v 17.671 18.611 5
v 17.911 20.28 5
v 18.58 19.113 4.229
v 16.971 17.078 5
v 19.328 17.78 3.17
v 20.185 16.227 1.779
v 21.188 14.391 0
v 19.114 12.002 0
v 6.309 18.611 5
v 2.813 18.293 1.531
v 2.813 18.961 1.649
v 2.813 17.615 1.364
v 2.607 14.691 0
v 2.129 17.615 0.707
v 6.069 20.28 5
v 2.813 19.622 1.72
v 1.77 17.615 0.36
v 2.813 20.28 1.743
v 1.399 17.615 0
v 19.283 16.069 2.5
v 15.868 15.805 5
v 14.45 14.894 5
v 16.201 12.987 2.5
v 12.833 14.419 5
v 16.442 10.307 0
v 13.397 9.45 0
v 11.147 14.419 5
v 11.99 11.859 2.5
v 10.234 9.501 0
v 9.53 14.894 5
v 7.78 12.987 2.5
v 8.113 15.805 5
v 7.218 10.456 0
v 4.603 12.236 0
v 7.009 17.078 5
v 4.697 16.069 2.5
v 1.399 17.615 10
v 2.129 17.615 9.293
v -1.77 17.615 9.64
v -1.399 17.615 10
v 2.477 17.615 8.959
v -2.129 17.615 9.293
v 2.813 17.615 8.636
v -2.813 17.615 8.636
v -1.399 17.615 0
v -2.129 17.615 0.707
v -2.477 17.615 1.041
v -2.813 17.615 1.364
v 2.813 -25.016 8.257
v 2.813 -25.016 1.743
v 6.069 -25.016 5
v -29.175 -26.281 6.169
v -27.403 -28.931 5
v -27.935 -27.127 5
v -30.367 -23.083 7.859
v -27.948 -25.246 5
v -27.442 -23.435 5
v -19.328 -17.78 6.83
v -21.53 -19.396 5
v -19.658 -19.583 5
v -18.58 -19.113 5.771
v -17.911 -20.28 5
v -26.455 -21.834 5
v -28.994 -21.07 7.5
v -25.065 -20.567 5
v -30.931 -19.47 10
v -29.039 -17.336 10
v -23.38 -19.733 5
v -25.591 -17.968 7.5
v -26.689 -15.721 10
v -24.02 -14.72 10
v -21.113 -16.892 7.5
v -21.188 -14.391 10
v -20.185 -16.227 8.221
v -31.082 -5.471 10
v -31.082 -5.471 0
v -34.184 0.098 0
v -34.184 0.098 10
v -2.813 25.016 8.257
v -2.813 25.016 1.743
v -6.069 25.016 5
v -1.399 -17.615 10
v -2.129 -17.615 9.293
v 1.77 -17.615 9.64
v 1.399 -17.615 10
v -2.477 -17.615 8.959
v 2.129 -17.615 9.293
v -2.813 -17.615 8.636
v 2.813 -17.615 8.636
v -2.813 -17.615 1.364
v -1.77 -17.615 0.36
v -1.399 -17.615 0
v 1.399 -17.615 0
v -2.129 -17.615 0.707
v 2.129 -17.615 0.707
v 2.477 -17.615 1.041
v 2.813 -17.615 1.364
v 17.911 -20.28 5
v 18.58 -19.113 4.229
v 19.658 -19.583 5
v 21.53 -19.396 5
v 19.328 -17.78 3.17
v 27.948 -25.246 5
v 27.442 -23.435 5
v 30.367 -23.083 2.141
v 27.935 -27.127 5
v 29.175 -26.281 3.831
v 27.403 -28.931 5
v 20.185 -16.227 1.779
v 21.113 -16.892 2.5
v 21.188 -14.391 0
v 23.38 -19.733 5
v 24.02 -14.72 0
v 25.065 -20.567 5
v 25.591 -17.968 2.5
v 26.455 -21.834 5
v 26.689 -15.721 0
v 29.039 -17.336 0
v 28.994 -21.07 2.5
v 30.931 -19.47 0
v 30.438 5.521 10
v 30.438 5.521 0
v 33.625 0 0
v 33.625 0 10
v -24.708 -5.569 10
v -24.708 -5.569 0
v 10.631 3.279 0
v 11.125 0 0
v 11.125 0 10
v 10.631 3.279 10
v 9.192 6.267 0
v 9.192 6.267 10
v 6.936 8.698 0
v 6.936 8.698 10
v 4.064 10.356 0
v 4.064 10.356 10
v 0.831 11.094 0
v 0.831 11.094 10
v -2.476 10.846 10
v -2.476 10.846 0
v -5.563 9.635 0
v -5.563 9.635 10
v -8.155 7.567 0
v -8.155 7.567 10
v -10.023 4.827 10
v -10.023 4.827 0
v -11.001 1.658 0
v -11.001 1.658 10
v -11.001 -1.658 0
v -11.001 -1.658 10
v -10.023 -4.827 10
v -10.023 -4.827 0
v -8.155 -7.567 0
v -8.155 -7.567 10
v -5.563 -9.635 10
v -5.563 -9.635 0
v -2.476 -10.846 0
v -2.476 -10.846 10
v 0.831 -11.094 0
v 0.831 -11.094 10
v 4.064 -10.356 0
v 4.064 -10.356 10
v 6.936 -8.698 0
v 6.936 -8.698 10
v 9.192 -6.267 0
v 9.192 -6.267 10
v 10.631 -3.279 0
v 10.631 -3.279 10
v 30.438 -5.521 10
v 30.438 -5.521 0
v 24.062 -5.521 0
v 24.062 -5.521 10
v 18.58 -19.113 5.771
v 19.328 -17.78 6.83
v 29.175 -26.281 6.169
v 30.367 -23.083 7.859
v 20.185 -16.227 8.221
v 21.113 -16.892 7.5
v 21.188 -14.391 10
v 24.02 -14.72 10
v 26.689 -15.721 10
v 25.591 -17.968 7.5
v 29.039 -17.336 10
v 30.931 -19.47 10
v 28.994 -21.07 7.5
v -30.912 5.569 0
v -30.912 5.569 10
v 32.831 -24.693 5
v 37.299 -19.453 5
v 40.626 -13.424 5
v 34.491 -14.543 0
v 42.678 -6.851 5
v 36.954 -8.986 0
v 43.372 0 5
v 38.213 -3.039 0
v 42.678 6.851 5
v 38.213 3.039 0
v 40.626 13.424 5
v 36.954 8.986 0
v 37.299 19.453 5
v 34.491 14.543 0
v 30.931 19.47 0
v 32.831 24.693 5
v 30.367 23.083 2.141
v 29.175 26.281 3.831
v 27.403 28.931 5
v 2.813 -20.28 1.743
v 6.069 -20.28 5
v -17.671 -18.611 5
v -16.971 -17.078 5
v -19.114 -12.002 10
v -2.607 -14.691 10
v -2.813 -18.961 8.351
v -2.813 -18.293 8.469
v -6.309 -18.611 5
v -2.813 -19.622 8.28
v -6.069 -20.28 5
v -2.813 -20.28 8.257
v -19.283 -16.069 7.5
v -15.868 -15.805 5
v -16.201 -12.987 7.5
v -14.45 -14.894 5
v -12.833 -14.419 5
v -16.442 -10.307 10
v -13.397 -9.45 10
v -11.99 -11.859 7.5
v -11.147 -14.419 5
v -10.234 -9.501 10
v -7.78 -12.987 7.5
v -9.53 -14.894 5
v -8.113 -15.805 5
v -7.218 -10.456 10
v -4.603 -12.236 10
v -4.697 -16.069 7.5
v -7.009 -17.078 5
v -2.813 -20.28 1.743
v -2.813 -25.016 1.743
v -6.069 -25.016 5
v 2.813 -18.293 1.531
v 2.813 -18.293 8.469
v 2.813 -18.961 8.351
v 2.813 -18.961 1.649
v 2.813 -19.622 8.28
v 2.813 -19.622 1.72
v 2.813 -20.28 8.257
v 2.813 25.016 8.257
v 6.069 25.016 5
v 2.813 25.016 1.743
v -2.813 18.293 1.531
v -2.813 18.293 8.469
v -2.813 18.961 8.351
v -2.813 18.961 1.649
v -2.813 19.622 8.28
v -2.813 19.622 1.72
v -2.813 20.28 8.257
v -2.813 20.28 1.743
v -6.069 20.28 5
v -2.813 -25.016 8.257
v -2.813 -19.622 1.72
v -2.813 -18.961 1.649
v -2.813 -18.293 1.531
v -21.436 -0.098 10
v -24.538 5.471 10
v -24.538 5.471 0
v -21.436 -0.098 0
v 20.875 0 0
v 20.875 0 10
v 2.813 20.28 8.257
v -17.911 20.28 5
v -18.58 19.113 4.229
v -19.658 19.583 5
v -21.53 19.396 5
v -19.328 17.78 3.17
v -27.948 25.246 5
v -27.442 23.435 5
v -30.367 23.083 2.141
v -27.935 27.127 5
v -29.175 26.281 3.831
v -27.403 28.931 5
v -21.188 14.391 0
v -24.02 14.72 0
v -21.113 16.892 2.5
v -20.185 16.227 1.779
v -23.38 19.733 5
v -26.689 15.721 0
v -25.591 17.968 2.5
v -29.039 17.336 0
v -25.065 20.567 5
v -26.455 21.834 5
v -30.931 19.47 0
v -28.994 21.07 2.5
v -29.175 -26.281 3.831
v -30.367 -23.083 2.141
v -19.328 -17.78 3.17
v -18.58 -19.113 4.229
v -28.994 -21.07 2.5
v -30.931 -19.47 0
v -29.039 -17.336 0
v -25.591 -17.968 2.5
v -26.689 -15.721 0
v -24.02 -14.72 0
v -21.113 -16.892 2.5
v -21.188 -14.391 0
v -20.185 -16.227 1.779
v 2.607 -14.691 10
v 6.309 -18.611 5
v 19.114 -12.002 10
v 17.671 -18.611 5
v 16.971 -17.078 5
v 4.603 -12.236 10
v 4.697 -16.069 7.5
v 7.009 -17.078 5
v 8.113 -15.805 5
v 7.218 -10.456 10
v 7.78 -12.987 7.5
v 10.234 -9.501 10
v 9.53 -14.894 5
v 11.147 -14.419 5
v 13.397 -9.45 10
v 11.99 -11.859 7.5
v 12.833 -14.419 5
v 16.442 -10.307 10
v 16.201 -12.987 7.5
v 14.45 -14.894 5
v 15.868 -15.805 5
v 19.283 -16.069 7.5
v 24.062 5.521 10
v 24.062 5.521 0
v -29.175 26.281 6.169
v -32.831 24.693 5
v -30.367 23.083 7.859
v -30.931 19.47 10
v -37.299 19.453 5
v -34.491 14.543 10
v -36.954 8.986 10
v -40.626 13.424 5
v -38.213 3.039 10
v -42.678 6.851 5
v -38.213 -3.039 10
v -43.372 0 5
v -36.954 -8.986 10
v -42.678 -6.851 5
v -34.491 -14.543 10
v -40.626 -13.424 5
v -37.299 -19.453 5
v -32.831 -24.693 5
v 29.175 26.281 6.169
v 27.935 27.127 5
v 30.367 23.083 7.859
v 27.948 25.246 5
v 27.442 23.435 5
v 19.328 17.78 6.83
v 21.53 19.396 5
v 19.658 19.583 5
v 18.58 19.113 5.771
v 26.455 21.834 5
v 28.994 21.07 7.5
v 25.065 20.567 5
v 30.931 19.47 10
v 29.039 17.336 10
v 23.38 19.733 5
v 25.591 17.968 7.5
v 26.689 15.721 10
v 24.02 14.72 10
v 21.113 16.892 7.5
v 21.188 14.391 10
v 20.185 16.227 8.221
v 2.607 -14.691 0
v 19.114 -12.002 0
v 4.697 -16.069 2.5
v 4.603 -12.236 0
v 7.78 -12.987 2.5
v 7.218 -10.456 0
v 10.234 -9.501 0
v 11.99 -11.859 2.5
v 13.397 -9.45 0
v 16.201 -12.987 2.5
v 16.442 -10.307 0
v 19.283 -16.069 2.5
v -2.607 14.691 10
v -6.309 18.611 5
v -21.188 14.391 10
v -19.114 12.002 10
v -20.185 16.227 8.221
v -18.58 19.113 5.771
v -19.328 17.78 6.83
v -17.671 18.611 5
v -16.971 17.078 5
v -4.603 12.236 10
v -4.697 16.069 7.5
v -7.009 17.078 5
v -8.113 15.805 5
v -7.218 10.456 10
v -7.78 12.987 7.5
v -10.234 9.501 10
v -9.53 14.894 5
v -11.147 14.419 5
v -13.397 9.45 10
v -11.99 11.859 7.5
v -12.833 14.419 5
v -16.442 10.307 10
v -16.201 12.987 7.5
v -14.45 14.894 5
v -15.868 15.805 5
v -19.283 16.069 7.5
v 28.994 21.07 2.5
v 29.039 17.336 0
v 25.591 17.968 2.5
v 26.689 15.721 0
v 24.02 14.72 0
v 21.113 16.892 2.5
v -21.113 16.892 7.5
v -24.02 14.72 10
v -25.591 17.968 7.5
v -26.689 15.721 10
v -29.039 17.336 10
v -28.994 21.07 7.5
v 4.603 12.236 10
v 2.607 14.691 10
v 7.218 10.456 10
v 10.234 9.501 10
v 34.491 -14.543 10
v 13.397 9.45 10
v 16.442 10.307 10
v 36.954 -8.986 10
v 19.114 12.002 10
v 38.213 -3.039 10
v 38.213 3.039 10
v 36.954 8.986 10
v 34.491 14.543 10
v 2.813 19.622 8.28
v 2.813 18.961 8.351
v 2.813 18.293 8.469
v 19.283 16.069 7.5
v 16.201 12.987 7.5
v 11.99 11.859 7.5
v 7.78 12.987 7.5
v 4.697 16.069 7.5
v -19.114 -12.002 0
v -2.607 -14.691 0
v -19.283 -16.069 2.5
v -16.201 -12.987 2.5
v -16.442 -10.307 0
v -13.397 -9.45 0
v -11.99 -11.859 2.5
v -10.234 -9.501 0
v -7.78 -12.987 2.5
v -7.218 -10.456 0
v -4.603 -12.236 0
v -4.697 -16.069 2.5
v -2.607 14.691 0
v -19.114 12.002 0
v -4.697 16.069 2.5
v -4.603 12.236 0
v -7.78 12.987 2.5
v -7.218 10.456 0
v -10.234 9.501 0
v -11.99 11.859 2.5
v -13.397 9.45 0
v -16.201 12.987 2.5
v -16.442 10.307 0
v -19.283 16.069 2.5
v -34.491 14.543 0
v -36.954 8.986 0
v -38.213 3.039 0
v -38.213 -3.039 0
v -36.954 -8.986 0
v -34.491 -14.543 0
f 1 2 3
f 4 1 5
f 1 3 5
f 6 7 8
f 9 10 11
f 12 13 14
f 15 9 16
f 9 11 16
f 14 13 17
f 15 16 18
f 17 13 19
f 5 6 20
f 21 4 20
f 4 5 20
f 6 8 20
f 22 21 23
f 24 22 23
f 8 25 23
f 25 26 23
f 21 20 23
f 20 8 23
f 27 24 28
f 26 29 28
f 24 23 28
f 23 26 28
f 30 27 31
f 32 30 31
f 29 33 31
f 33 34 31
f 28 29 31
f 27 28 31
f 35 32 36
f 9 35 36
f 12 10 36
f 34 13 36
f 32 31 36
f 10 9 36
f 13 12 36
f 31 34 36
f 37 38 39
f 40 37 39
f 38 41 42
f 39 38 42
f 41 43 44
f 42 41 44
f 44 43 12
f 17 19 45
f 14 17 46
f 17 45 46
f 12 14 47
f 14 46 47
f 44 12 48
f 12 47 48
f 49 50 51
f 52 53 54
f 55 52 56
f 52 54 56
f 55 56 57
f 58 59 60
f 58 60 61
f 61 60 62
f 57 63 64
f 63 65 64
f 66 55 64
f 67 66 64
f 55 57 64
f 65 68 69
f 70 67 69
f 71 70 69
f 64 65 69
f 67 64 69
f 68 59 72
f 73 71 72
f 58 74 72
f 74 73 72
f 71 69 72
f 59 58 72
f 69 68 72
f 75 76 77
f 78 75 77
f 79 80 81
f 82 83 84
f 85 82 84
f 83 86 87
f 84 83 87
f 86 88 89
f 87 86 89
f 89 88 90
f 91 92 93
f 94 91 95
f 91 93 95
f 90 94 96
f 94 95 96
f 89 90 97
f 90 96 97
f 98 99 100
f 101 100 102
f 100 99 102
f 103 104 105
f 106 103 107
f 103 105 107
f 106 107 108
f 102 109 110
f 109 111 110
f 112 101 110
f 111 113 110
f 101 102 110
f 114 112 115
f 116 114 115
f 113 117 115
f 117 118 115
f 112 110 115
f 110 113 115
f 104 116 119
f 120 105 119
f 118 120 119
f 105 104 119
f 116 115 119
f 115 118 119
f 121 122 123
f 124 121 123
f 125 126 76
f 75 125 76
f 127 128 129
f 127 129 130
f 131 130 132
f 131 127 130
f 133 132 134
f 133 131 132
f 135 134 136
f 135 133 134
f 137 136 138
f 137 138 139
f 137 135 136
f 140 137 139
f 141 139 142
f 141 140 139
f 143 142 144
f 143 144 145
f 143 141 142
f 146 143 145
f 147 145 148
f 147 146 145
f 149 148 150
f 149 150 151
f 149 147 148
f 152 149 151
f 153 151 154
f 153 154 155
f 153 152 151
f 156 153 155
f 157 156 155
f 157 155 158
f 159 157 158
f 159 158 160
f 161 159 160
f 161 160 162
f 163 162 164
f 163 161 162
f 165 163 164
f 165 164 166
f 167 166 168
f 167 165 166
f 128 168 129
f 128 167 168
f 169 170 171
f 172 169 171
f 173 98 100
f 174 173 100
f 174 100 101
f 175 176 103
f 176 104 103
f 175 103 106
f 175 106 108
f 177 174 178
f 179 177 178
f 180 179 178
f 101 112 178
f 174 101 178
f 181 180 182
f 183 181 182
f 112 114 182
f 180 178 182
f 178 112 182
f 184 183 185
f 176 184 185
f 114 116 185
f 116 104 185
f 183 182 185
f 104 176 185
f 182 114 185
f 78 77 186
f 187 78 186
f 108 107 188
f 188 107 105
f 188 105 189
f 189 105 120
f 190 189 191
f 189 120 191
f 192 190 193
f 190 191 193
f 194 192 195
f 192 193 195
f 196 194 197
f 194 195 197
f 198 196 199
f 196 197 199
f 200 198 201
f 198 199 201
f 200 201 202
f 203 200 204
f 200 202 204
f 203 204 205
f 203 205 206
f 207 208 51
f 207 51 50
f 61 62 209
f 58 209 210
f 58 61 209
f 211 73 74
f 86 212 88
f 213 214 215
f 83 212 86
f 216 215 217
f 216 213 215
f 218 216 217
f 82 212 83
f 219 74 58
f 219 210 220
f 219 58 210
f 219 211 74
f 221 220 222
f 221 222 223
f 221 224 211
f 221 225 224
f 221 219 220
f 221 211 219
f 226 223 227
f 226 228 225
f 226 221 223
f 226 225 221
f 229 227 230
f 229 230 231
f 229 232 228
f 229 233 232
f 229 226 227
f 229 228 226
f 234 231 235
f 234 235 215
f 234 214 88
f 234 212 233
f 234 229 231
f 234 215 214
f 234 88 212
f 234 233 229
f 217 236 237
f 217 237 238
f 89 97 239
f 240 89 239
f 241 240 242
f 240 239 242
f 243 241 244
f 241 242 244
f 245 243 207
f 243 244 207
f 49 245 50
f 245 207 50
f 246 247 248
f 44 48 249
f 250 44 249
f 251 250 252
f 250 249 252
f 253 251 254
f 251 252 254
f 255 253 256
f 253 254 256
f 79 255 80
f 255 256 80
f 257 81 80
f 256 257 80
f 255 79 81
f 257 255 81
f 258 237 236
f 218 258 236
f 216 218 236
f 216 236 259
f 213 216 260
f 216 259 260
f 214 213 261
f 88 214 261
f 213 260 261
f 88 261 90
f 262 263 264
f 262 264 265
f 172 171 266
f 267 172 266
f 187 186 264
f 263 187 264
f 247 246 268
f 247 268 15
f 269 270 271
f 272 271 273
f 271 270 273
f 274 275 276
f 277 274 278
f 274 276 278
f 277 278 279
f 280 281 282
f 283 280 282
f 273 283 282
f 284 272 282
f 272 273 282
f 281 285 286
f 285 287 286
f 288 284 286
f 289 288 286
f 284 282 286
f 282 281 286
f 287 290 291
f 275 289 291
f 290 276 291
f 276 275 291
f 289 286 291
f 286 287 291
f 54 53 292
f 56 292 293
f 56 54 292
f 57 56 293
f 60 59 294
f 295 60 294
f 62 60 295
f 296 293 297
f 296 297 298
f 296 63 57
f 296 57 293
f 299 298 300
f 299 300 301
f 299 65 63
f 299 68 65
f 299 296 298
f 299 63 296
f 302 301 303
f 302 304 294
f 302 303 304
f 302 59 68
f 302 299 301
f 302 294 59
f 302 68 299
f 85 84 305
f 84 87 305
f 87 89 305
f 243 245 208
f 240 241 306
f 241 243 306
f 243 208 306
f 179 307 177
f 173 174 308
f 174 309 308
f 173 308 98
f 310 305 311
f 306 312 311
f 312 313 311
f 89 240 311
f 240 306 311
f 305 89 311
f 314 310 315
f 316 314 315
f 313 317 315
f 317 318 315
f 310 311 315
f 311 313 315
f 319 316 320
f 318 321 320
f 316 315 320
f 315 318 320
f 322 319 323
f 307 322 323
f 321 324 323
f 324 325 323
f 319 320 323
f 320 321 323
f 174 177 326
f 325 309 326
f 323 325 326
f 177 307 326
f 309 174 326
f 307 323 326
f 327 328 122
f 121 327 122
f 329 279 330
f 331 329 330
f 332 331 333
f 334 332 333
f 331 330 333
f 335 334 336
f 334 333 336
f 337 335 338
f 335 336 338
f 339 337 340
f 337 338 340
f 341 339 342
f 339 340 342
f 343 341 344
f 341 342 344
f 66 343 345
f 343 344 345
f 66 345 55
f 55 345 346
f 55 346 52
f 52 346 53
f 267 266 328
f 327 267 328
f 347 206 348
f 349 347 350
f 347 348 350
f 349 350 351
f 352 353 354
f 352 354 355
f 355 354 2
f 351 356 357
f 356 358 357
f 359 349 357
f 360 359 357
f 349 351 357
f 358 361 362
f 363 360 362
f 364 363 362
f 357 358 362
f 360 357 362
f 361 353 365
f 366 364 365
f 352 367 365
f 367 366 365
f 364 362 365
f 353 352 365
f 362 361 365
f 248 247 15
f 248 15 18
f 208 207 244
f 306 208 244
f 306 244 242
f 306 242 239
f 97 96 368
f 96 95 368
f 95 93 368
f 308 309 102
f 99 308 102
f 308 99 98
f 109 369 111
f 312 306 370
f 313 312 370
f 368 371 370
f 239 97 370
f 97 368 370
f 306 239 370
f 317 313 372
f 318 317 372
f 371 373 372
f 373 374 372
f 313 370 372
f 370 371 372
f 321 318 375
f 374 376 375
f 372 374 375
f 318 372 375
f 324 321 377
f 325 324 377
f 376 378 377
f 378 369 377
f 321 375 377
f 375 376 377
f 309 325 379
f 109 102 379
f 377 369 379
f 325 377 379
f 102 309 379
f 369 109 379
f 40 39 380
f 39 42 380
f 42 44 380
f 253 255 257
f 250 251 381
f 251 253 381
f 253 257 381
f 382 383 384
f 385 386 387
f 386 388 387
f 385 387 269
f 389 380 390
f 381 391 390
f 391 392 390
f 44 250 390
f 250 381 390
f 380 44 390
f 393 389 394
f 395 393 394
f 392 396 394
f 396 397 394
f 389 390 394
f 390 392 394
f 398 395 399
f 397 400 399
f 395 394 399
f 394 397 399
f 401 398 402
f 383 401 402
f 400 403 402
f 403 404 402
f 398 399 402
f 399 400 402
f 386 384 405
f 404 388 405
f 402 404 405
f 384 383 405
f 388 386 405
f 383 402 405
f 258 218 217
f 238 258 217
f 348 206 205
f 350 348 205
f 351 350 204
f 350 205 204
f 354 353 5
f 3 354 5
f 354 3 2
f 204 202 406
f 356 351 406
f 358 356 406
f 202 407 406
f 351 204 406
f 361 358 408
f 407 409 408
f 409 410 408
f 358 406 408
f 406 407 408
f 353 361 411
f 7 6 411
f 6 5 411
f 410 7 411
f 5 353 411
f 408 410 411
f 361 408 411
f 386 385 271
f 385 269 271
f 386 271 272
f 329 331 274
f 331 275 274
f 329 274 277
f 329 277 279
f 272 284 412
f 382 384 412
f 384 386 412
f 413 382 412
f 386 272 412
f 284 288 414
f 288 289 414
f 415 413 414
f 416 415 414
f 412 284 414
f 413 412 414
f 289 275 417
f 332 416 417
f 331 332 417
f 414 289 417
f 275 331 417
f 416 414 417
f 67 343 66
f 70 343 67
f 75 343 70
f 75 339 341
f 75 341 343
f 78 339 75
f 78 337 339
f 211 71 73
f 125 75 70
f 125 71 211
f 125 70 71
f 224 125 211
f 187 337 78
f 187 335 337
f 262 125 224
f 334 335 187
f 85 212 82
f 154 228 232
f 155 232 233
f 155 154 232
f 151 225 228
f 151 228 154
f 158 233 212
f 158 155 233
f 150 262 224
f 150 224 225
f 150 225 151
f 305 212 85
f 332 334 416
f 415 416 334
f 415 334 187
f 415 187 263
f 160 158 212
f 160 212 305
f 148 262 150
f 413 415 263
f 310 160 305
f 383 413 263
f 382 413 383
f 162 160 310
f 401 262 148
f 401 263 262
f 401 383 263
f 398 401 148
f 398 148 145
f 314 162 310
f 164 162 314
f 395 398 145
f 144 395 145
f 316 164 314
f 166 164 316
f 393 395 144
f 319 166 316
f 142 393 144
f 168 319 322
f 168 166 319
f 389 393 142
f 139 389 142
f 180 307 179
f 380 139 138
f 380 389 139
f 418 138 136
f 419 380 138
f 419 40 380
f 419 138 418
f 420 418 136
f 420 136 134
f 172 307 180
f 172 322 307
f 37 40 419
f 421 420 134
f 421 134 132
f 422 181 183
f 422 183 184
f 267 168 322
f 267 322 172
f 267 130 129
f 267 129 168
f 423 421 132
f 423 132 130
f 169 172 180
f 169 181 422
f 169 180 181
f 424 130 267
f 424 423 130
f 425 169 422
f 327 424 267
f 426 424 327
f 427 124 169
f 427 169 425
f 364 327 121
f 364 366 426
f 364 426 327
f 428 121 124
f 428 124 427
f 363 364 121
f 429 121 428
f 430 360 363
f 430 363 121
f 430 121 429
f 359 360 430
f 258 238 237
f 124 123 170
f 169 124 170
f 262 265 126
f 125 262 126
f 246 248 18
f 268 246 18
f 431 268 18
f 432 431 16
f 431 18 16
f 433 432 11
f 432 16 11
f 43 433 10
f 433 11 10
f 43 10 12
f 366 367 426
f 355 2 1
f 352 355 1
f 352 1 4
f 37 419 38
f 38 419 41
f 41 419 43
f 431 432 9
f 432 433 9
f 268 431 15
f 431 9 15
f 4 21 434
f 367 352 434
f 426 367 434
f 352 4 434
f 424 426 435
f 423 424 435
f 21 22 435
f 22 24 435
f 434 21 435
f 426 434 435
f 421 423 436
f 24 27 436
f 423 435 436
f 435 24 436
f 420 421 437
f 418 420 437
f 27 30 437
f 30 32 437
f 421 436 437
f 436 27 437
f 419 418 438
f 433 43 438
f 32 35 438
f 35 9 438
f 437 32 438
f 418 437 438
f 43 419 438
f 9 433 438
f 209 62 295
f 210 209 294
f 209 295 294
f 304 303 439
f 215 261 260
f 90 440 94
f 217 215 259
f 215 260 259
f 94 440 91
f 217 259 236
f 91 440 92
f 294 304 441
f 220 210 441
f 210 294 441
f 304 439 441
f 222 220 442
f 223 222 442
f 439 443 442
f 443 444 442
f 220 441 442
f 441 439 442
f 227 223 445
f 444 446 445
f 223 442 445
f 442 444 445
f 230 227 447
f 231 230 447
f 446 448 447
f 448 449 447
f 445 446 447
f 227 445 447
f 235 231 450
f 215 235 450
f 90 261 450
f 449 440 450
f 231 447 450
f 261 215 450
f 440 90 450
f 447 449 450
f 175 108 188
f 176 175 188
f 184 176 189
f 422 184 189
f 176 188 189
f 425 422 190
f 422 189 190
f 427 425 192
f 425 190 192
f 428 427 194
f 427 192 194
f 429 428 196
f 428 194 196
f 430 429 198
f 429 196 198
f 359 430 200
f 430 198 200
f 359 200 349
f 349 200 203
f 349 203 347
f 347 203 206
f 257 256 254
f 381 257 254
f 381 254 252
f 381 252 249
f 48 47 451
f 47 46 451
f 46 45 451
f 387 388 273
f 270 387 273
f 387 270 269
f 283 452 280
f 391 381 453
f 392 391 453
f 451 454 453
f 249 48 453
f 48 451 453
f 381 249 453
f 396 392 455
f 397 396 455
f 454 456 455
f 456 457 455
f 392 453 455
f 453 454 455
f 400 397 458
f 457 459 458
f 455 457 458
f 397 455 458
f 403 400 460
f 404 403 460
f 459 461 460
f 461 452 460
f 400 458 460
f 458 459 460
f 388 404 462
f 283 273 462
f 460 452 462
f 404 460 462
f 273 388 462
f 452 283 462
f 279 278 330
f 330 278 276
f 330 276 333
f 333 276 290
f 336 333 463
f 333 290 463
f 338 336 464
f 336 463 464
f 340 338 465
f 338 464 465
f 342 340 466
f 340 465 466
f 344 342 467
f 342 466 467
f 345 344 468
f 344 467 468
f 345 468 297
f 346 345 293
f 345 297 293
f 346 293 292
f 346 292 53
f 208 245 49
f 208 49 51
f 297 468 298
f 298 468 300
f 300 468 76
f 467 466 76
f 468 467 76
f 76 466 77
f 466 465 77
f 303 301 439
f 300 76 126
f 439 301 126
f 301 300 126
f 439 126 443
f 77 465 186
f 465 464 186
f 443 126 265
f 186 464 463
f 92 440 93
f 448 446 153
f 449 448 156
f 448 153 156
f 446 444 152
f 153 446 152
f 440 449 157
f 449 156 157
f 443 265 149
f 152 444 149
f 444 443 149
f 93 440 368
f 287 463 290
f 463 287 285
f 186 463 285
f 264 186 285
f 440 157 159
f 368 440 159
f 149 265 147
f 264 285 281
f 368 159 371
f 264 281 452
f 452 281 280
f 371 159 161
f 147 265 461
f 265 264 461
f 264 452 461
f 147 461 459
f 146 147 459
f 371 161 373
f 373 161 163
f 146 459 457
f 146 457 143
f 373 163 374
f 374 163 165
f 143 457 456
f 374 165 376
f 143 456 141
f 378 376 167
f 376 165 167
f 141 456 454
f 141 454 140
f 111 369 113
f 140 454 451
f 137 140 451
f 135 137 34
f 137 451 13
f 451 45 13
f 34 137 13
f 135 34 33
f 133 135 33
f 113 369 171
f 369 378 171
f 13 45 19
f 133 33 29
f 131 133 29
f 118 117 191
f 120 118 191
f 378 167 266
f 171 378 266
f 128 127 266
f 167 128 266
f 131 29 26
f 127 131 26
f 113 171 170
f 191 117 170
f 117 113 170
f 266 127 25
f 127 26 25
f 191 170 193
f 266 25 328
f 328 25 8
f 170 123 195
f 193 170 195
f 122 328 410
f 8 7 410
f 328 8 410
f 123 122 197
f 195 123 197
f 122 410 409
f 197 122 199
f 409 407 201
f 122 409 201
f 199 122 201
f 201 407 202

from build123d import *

# Parameters (mm, degrees)
F0_R         = 11.125
F1_DEPTH     = 10
F2_T1_DEPTH  = 17.5952575274
F2_T3_DEPTH  = 17.5952575274
F2_T6_ANGLE  = 359.64
F2_T8_ANGLE  = 359.64
F2_T10_ANGLE = 158.7108465942
F2_T12_ANGLE = 359.64
F2_T14_ANGLE = 359.64
F2_T16_ANGLE = 359.64
F2_T18_ANGLE = 359.64
F2_T20_ANGLE = 158.7108465942
F2_T22_ANGLE = 359.64
F2_T24_ANGLE = 359.64
F2_T26_ANGLE = 359.64
F2_T28_ANGLE = 158.7108465942
F2_T30_ANGLE = 359.64
F2_T32_ANGLE = 359.64
F2_T34_ANGLE = 359.64
F2_T36_ANGLE = 359.64
F2_T38_ANGLE = 359.64
F2_T40_ANGLE = 359.64
F2_T42_ANGLE = 158.7108465942
F2_T44_ANGLE = 359.64


# Not quite as in the source:
# - a fillet or chamfer that OpenCascade refuses, or shapes differently, is made with other operations: its cross-section is extruded or revolved along the edge and cut away or added


with BuildPart() as f1:
    # F0 (on Top) → F1 (new body)
    with BuildSketch(Plane.XY):
        with BuildLine():
            Line((-2.8125022072, -17.6151320338), (0, -17.6151320338))
            Line((0, -17.6151320338), (2.8125022072, -17.6151320338))
            Line((2.8125022072, -17.6151320338), (2.8125022072, -25.0164493918))
            Line((2.8125022072, -25.0164493918), (6.0690809041, -25.0164493918))
            Line((6.0690809041, -25.0164493918), (6.0690809041, -20.2796068043))
            ThreePointArc((6.0690809041, -20.2796068043), (11.9901318103, -14.3585558981), (17.9111827165, -20.2796068043))
            ThreePointArc((17.9111827165, -20.2796068043), (25.8046814323, -21.1516241303), (27.4031855301, -28.930603552))
            ThreePointArc((27.4031855301, -28.930603552), (43.3717109263, 0), (27.4031855301, 28.930603552))
            ThreePointArc((27.4031855301, 28.930603552), (25.8046814323, 21.1516241303), (17.9111827165, 20.2796068043))
            ThreePointArc((17.9111827165, 20.2796068043), (11.9901318103, 14.3585558981), (6.0690809041, 20.2796068043))
            Line((6.0690809041, 20.2796068043), (6.0690809041, 25.0164493918))
            Line((6.0690809041, 25.0164493918), (2.8125022072, 25.0164493918))
            Line((2.8125022072, 25.0164493918), (2.8125022072, 17.6151320338))
            Line((2.8125022072, 17.6151320338), (0, 17.6151320338))
            Line((0, 17.6151320338), (-2.8125022072, 17.6151320338))
            Line((-2.8125022072, 17.6151320338), (-2.8125022072, 25.0164493918))
            Line((-2.8125022072, 25.0164493918), (-6.0690809041, 25.0164493918))
            Line((-6.0690809041, 25.0164493918), (-6.0690809041, 20.2796068043))
            ThreePointArc((-6.0690809041, 20.2796068043), (-11.9901318103, 14.3585558981), (-17.9111827165, 20.2796068043))
            ThreePointArc((-17.9111827165, 20.2796068043), (-25.8046814323, 21.1516241303), (-27.4031855301, 28.930603552))
            ThreePointArc((-27.4031855301, 28.930603552), (-43.3717109263, 0), (-27.4031855301, -28.930603552))
            ThreePointArc((-27.4031855301, -28.930603552), (-25.8046814323, -21.1516241303), (-17.9111827165, -20.2796068043))
            ThreePointArc((-17.9111827165, -20.2796068043), (-11.9901318103, -14.3585558981), (-6.0690809041, -20.2796068043))
            Line((-6.0690809041, -20.2796068043), (-6.0690809041, -25.0164493918))
            Line((-6.0690809041, -25.0164493918), (-2.8125022072, -25.0164493918))
            Line((-2.8125022072, -25.0164493918), (-2.8125022072, -17.6151320338))
        make_face()
        Polygon((-30.9119913686, 5.5693711821), (-24.537748198, 5.4711418492), (-21.4356957103, -0.0982293328), (-24.7078863932, -5.5693711821), (-31.0821295639, -5.4711418492), (-34.1841820515, 0.0982293328), align=None, mode=Mode.SUBTRACT)
        Circle(F0_R, mode=Mode.SUBTRACT)
        Polygon((20.875, 0), (24.0625, 5.5209119491), (30.4375, 5.5209119491), (33.625, 0), (30.4375, -5.5209119491), (24.0625, -5.5209119491), align=None, mode=Mode.SUBTRACT)
    extrude(amount=F1_DEPTH)

    # F2: chamfer of 5 on 20 edges, made by hand

    # F2_s2 → F2_t1 (cut)
    with BuildSketch(Plane.XZ.offset(-37.8748643317)):
        Polygon((-6.0690809041, 5), (-1.0690809041, 0), (-6.0690809041, 0), align=None)
        Polygon((6.0690809041, 5), (1.0690809041, 0), (6.0690809041, 0), align=None)
        Polygon((1.0690809041, 10), (6.0690809041, 5), (6.0690809041, 10), align=None)
        Polygon((-1.0690809041, 10), (-6.0690809041, 5), (-6.0690809041, 10), align=None)
    extrude(amount=F2_T1_DEPTH, mode=Mode.SUBTRACT)

    # F2_s4 → F2_t3 (cut)
    with BuildSketch(Plane.XZ.offset(20.2796068043)):
        Polygon((-1.0690809041, 0), (-6.0690809041, 5), (-6.0690809041, 0), align=None)
        Polygon((6.0690809041, 5), (1.0690809041, 0), (6.0690809041, 0), align=None)
        Polygon((1.0690809041, 10), (6.0690809041, 5), (6.0690809041, 10), align=None)
        Polygon((-1.0690809041, 10), (-6.0690809041, 5), (-6.0690809041, 10), align=None)
    extrude(amount=F2_T3_DEPTH, mode=Mode.SUBTRACT)

    # F2_s5 → F2_t6 (revolve, cut)
    with BuildSketch(Plane(origin=(-24.5672156268, 22.5322183518, 0), x_dir=(0, 0, 1), z_dir=(-0.7369707586, 0.6759246267, 0))):
        Polygon((10, 16.6434047939), (5, 11.6434047939), (10, 11.6434047939), align=None)
    revolve(axis=Axis((-21.2587402157, 26.1394987159, 10), (0, 0, -1)), revolution_arc=F2_T6_ANGLE, mode=Mode.SUBTRACT)

    # F2_s7 → F2_t8 (revolve, cut)
    with BuildSketch(Plane.XZ.offset(-20.2796068043)):
        Polygon((-1.0690809041, 10), (-6.0690809041, 5), (-6.0690809041, 10), align=None)
    revolve(axis=Axis((-11.9901318103, 20.2796068043, 10), (0, 0, -1)), revolution_arc=F2_T8_ANGLE, mode=Mode.SUBTRACT)

    # F2_s9 → F2_t10 (revolve, cut)
    with BuildSketch(Plane(origin=(-8.8670439331, -1.6665634724, 0), x_dir=(0, 0, 1), z_dir=(0.9827919356, 0.1847160286, 0))):
        Polygon((10, -30.8871798498), (5, -35.8871798498), (10, -35.8871798498), align=None)
    revolve(axis=Axis((-9.1802750199, 0, 10), (0, 0, 1)), revolution_arc=F2_T10_ANGLE, mode=Mode.SUBTRACT)

    # F2_s11 → F2_t12 (revolve, cut)
    with BuildSketch(Plane(origin=(-24.6850209159, -22.3563277123, 0), x_dir=(0, 0, 1), z_dir=(0.7412031432, 0.6712807911, 0))):
        Polygon((10, 16.8527592984), (5, 11.8527592984), (10, 11.8527592984), align=None)
    revolve(axis=Axis((-21.2587402157, -26.1394987159, 10), (0, 0, -1)), revolution_arc=F2_T12_ANGLE, mode=Mode.SUBTRACT)

    # F2_s13 → F2_t14 (revolve, cut)
    with BuildSketch(Plane(origin=(-0.1278905192, -20.3541404453, 0), x_dir=(0, 0, 1), z_dir=(0.006283144, 0.9999802609, 0))):
        Polygon((5, -5.9414245401), (10, -0.9414245401), (10, -5.9414245401), align=None)
    revolve(axis=Axis((-11.9901318103, -20.2796068043, 10), (0, 0, -1)), revolution_arc=F2_T14_ANGLE, mode=Mode.SUBTRACT)

    # F2_s15 → F2_t16 (revolve, cut)
    with BuildSketch(Plane.XZ.offset(20.2796068043)):
        Polygon((1.0690809041, 10), (6.0690809041, 5), (6.0690809041, 10), align=None)
    revolve(axis=Axis((11.9901318103, -20.2796068043, 10), (0, 0, -1)), revolution_arc=F2_T16_ANGLE, mode=Mode.SUBTRACT)

    # F2_s17 → F2_t18 (revolve, cut)
    with BuildSketch(Plane(origin=(24.5672156268, -22.5322183518, 0), x_dir=(0, 0, 1), z_dir=(0.7369707586, -0.6759246267, 0))):
        Polygon((10, 16.6434047939), (5, 11.6434047939), (10, 11.6434047939), align=None)
    revolve(axis=Axis((21.2587402157, -26.1394987159, 10), (0, 0, -1)), revolution_arc=F2_T18_ANGLE, mode=Mode.SUBTRACT)

    # F2_s19 → F2_t20 (revolve, cut)
    with BuildSketch(Plane(origin=(8.8670439331, 1.6665634724, 0), x_dir=(0, 0, 1), z_dir=(-0.9827919356, -0.1847160286, 0))):
        Polygon((10, -30.8871798498), (5, -35.8871798498), (10, -35.8871798498), align=None)
    revolve(axis=Axis((9.1802750199, 0, 10), (0, 0, 1)), revolution_arc=F2_T20_ANGLE, mode=Mode.SUBTRACT)

    # F2_s21 → F2_t22 (revolve, cut)
    with BuildSketch(Plane(origin=(24.6850209159, 22.3563277123, 0), x_dir=(0, 0, 1), z_dir=(-0.7412031432, -0.6712807911, 0))):
        Polygon((10, 16.8527592984), (5, 11.8527592984), (10, 11.8527592984), align=None)
    revolve(axis=Axis((21.2587402157, 26.1394987159, 10), (0, 0, -1)), revolution_arc=F2_T22_ANGLE, mode=Mode.SUBTRACT)

    # F2_s23 → F2_t24 (revolve, cut)
    with BuildSketch(Plane(origin=(0.1278905192, 20.3541404453, 0), x_dir=(0, 0, 1), z_dir=(-0.006283144, -0.9999802609, 0))):
        Polygon((10, -0.9414245401), (5, -5.9414245401), (10, -5.9414245401), align=None)
    revolve(axis=Axis((11.9901318103, 20.2796068043, 10), (0, 0, -1)), revolution_arc=F2_T24_ANGLE, mode=Mode.SUBTRACT)

    # F2_s25 → F2_t26 (revolve, cut)
    with BuildSketch(Plane(origin=(24.6850209159, 22.3563277123, 0), x_dir=(0, 0, 1), z_dir=(-0.7412031432, -0.6712807911, 0))):
        Polygon((5, 11.8527592984), (0, 16.8527592984), (0, 11.8527592984), align=None)
    revolve(axis=Axis((21.2587402157, 26.1394987159, 0), (0, 0, -1)), revolution_arc=F2_T26_ANGLE, mode=Mode.SUBTRACT)

    # F2_s27 → F2_t28 (revolve, cut)
    with BuildSketch(Plane(origin=(8.8670439331, 1.6665634724, 0), x_dir=(0, 0, 1), z_dir=(-0.9827919356, -0.1847160286, 0))):
        Polygon((5, -35.8871798498), (0, -30.8871798498), (0, -35.8871798498), align=None)
    revolve(axis=Axis((9.1802750199, 0, 0), (0, 0, 1)), revolution_arc=F2_T28_ANGLE, mode=Mode.SUBTRACT)

    # F2_s29 → F2_t30 (revolve, cut)
    with BuildSketch(Plane(origin=(24.5672156268, -22.5322183518, 0), x_dir=(0, 0, 1), z_dir=(0.7369707586, -0.6759246267, 0))):
        Polygon((5, 11.6434047939), (0, 16.6434047939), (0, 11.6434047939), align=None)
    revolve(axis=Axis((21.2587402157, -26.1394987159, 0), (0, 0, -1)), revolution_arc=F2_T30_ANGLE, mode=Mode.SUBTRACT)

    # F2_s31 → F2_t32 (revolve, cut)
    with BuildSketch(Plane.XZ.offset(20.2796068043)):
        Polygon((6.0690809041, 5), (1.0690809041, 0), (6.0690809041, 0), align=None)
    revolve(axis=Axis((11.9901318103, -20.2796068043, 0), (0, 0, -1)), revolution_arc=F2_T32_ANGLE, mode=Mode.SUBTRACT)

    # F2_s33 → F2_t34 (revolve, cut)
    with BuildSketch(Plane(origin=(-0.1278905192, -20.3541404453, 0), x_dir=(0, 0, 1), z_dir=(0.006283144, 0.9999802609, 0))):
        Polygon((5, -5.9414245401), (0, -0.9414245401), (0, -5.9414245401), align=None)
    revolve(axis=Axis((-11.9901318103, -20.2796068043, 0), (0, 0, -1)), revolution_arc=F2_T34_ANGLE, mode=Mode.SUBTRACT)

    # F2_s35 → F2_t36 (revolve, cut)
    with BuildSketch(Plane(origin=(0.1278905192, 20.3541404453, 0), x_dir=(0, 0, 1), z_dir=(-0.006283144, -0.9999802609, 0))):
        Polygon((5, -5.9414245401), (0, -0.9414245401), (0, -5.9414245401), align=None)
    revolve(axis=Axis((11.9901318103, 20.2796068043, 0), (0, 0, -1)), revolution_arc=F2_T36_ANGLE, mode=Mode.SUBTRACT)

    # F2_s37 → F2_t38 (revolve, cut)
    with BuildSketch(Plane.XZ.offset(-20.2796068043)):
        Polygon((-6.0690809041, 5), (-1.0690809041, 0), (-6.0690809041, 0), align=None)
    revolve(axis=Axis((-11.9901318103, 20.2796068043, 0), (0, 0, -1)), revolution_arc=F2_T38_ANGLE, mode=Mode.SUBTRACT)

    # F2_s39 → F2_t40 (revolve, cut)
    with BuildSketch(Plane(origin=(-24.5672156268, 22.5322183518, 0), x_dir=(0, 0, 1), z_dir=(-0.7369707586, 0.6759246267, 0))):
        Polygon((5, 11.6434047939), (0, 16.6434047939), (0, 11.6434047939), align=None)
    revolve(axis=Axis((-21.2587402157, 26.1394987159, 0), (0, 0, -1)), revolution_arc=F2_T40_ANGLE, mode=Mode.SUBTRACT)

    # F2_s41 → F2_t42 (revolve, cut)
    with BuildSketch(Plane(origin=(-8.8670439331, -1.6665634724, 0), x_dir=(0, 0, 1), z_dir=(0.9827919356, 0.1847160286, 0))):
        Polygon((5, -35.8871798498), (0, -30.8871798498), (0, -35.8871798498), align=None)
    revolve(axis=Axis((-9.1802750199, 0, 0), (0, 0, 1)), revolution_arc=F2_T42_ANGLE, mode=Mode.SUBTRACT)

    # F2_s43 → F2_t44 (revolve, cut)
    with BuildSketch(Plane(origin=(-24.6850209159, -22.3563277123, 0), x_dir=(0, 0, 1), z_dir=(0.7412031432, 0.6712807911, 0))):
        Polygon((0, 16.8527592984), (5, 11.8527592984), (0, 11.8527592984), align=None)
    revolve(axis=Axis((-21.2587402157, -26.1394987159, 0), (0, 0, -1)), revolution_arc=F2_T44_ANGLE, mode=Mode.SUBTRACT)


solid = f1.part
